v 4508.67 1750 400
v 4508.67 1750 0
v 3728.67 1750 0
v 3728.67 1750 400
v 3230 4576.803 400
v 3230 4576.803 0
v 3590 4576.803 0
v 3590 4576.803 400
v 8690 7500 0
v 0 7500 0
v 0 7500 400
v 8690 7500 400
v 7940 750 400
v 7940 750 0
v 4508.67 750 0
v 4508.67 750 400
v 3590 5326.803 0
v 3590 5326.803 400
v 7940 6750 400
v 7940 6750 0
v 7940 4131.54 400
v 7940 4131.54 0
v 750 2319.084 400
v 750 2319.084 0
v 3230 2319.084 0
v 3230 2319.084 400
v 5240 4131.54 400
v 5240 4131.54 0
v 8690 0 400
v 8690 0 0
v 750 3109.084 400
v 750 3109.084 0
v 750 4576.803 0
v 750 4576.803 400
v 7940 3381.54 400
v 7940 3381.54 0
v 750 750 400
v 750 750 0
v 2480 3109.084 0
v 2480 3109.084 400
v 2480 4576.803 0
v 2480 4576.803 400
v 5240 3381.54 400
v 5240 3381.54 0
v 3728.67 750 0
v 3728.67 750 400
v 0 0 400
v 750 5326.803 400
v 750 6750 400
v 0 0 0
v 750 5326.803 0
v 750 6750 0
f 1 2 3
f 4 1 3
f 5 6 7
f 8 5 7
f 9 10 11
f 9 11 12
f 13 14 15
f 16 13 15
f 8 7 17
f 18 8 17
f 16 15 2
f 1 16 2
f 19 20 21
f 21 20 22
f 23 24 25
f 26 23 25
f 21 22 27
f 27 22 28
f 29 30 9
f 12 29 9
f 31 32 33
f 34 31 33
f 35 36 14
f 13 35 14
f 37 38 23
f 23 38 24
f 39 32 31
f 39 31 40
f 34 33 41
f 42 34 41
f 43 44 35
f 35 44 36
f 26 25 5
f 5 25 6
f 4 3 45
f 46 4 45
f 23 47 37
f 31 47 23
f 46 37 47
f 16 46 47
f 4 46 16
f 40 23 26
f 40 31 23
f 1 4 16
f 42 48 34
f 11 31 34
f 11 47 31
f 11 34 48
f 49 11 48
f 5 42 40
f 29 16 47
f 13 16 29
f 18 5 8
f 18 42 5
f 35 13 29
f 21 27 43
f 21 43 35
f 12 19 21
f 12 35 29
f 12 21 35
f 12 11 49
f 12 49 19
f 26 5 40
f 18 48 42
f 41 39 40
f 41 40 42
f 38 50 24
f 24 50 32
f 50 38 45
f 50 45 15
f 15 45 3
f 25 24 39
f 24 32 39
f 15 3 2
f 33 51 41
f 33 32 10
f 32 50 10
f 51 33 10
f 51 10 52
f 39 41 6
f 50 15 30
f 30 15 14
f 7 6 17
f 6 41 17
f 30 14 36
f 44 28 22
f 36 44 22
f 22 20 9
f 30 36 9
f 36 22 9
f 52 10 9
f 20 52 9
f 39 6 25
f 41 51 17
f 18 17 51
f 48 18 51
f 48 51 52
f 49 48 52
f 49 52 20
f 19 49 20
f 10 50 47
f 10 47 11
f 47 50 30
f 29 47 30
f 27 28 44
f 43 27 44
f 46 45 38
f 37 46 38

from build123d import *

# Parameters (mm, degrees)
F0_W     = 8690
F0_H     = 7500
F0_W_2   = 1730
F0_H_2   = 1467.718564
F1_DEPTH = 400


with BuildPart() as f1:
    # F0 (on Top) → F1 (new body)
    with BuildSketch(Plane.XY):
        with Locations((4345, 3750)):
            Rectangle(F0_W, F0_H)
        with Locations((1615, 3842.943449)):
            Rectangle(F0_W_2, F0_H_2, mode=Mode.SUBTRACT)
        Polygon((3728.670418, 750), (750, 750), (750, 2319.084167), (3230, 2319.084167), (3230, 4576.802731), (3590, 4576.802731), (3590, 5326.802731), (750, 5326.802731), (750, 6750), (7940, 6750), (7940, 4131.539822), (5240, 4131.539822), (5240, 3381.539822), (7940, 3381.539822), (7940, 750), (4508.670418, 750), (4508.670418, 1750), (3728.670418, 1750), align=None, mode=Mode.SUBTRACT)
    extrude(amount=F1_DEPTH)


solid = f1.part
